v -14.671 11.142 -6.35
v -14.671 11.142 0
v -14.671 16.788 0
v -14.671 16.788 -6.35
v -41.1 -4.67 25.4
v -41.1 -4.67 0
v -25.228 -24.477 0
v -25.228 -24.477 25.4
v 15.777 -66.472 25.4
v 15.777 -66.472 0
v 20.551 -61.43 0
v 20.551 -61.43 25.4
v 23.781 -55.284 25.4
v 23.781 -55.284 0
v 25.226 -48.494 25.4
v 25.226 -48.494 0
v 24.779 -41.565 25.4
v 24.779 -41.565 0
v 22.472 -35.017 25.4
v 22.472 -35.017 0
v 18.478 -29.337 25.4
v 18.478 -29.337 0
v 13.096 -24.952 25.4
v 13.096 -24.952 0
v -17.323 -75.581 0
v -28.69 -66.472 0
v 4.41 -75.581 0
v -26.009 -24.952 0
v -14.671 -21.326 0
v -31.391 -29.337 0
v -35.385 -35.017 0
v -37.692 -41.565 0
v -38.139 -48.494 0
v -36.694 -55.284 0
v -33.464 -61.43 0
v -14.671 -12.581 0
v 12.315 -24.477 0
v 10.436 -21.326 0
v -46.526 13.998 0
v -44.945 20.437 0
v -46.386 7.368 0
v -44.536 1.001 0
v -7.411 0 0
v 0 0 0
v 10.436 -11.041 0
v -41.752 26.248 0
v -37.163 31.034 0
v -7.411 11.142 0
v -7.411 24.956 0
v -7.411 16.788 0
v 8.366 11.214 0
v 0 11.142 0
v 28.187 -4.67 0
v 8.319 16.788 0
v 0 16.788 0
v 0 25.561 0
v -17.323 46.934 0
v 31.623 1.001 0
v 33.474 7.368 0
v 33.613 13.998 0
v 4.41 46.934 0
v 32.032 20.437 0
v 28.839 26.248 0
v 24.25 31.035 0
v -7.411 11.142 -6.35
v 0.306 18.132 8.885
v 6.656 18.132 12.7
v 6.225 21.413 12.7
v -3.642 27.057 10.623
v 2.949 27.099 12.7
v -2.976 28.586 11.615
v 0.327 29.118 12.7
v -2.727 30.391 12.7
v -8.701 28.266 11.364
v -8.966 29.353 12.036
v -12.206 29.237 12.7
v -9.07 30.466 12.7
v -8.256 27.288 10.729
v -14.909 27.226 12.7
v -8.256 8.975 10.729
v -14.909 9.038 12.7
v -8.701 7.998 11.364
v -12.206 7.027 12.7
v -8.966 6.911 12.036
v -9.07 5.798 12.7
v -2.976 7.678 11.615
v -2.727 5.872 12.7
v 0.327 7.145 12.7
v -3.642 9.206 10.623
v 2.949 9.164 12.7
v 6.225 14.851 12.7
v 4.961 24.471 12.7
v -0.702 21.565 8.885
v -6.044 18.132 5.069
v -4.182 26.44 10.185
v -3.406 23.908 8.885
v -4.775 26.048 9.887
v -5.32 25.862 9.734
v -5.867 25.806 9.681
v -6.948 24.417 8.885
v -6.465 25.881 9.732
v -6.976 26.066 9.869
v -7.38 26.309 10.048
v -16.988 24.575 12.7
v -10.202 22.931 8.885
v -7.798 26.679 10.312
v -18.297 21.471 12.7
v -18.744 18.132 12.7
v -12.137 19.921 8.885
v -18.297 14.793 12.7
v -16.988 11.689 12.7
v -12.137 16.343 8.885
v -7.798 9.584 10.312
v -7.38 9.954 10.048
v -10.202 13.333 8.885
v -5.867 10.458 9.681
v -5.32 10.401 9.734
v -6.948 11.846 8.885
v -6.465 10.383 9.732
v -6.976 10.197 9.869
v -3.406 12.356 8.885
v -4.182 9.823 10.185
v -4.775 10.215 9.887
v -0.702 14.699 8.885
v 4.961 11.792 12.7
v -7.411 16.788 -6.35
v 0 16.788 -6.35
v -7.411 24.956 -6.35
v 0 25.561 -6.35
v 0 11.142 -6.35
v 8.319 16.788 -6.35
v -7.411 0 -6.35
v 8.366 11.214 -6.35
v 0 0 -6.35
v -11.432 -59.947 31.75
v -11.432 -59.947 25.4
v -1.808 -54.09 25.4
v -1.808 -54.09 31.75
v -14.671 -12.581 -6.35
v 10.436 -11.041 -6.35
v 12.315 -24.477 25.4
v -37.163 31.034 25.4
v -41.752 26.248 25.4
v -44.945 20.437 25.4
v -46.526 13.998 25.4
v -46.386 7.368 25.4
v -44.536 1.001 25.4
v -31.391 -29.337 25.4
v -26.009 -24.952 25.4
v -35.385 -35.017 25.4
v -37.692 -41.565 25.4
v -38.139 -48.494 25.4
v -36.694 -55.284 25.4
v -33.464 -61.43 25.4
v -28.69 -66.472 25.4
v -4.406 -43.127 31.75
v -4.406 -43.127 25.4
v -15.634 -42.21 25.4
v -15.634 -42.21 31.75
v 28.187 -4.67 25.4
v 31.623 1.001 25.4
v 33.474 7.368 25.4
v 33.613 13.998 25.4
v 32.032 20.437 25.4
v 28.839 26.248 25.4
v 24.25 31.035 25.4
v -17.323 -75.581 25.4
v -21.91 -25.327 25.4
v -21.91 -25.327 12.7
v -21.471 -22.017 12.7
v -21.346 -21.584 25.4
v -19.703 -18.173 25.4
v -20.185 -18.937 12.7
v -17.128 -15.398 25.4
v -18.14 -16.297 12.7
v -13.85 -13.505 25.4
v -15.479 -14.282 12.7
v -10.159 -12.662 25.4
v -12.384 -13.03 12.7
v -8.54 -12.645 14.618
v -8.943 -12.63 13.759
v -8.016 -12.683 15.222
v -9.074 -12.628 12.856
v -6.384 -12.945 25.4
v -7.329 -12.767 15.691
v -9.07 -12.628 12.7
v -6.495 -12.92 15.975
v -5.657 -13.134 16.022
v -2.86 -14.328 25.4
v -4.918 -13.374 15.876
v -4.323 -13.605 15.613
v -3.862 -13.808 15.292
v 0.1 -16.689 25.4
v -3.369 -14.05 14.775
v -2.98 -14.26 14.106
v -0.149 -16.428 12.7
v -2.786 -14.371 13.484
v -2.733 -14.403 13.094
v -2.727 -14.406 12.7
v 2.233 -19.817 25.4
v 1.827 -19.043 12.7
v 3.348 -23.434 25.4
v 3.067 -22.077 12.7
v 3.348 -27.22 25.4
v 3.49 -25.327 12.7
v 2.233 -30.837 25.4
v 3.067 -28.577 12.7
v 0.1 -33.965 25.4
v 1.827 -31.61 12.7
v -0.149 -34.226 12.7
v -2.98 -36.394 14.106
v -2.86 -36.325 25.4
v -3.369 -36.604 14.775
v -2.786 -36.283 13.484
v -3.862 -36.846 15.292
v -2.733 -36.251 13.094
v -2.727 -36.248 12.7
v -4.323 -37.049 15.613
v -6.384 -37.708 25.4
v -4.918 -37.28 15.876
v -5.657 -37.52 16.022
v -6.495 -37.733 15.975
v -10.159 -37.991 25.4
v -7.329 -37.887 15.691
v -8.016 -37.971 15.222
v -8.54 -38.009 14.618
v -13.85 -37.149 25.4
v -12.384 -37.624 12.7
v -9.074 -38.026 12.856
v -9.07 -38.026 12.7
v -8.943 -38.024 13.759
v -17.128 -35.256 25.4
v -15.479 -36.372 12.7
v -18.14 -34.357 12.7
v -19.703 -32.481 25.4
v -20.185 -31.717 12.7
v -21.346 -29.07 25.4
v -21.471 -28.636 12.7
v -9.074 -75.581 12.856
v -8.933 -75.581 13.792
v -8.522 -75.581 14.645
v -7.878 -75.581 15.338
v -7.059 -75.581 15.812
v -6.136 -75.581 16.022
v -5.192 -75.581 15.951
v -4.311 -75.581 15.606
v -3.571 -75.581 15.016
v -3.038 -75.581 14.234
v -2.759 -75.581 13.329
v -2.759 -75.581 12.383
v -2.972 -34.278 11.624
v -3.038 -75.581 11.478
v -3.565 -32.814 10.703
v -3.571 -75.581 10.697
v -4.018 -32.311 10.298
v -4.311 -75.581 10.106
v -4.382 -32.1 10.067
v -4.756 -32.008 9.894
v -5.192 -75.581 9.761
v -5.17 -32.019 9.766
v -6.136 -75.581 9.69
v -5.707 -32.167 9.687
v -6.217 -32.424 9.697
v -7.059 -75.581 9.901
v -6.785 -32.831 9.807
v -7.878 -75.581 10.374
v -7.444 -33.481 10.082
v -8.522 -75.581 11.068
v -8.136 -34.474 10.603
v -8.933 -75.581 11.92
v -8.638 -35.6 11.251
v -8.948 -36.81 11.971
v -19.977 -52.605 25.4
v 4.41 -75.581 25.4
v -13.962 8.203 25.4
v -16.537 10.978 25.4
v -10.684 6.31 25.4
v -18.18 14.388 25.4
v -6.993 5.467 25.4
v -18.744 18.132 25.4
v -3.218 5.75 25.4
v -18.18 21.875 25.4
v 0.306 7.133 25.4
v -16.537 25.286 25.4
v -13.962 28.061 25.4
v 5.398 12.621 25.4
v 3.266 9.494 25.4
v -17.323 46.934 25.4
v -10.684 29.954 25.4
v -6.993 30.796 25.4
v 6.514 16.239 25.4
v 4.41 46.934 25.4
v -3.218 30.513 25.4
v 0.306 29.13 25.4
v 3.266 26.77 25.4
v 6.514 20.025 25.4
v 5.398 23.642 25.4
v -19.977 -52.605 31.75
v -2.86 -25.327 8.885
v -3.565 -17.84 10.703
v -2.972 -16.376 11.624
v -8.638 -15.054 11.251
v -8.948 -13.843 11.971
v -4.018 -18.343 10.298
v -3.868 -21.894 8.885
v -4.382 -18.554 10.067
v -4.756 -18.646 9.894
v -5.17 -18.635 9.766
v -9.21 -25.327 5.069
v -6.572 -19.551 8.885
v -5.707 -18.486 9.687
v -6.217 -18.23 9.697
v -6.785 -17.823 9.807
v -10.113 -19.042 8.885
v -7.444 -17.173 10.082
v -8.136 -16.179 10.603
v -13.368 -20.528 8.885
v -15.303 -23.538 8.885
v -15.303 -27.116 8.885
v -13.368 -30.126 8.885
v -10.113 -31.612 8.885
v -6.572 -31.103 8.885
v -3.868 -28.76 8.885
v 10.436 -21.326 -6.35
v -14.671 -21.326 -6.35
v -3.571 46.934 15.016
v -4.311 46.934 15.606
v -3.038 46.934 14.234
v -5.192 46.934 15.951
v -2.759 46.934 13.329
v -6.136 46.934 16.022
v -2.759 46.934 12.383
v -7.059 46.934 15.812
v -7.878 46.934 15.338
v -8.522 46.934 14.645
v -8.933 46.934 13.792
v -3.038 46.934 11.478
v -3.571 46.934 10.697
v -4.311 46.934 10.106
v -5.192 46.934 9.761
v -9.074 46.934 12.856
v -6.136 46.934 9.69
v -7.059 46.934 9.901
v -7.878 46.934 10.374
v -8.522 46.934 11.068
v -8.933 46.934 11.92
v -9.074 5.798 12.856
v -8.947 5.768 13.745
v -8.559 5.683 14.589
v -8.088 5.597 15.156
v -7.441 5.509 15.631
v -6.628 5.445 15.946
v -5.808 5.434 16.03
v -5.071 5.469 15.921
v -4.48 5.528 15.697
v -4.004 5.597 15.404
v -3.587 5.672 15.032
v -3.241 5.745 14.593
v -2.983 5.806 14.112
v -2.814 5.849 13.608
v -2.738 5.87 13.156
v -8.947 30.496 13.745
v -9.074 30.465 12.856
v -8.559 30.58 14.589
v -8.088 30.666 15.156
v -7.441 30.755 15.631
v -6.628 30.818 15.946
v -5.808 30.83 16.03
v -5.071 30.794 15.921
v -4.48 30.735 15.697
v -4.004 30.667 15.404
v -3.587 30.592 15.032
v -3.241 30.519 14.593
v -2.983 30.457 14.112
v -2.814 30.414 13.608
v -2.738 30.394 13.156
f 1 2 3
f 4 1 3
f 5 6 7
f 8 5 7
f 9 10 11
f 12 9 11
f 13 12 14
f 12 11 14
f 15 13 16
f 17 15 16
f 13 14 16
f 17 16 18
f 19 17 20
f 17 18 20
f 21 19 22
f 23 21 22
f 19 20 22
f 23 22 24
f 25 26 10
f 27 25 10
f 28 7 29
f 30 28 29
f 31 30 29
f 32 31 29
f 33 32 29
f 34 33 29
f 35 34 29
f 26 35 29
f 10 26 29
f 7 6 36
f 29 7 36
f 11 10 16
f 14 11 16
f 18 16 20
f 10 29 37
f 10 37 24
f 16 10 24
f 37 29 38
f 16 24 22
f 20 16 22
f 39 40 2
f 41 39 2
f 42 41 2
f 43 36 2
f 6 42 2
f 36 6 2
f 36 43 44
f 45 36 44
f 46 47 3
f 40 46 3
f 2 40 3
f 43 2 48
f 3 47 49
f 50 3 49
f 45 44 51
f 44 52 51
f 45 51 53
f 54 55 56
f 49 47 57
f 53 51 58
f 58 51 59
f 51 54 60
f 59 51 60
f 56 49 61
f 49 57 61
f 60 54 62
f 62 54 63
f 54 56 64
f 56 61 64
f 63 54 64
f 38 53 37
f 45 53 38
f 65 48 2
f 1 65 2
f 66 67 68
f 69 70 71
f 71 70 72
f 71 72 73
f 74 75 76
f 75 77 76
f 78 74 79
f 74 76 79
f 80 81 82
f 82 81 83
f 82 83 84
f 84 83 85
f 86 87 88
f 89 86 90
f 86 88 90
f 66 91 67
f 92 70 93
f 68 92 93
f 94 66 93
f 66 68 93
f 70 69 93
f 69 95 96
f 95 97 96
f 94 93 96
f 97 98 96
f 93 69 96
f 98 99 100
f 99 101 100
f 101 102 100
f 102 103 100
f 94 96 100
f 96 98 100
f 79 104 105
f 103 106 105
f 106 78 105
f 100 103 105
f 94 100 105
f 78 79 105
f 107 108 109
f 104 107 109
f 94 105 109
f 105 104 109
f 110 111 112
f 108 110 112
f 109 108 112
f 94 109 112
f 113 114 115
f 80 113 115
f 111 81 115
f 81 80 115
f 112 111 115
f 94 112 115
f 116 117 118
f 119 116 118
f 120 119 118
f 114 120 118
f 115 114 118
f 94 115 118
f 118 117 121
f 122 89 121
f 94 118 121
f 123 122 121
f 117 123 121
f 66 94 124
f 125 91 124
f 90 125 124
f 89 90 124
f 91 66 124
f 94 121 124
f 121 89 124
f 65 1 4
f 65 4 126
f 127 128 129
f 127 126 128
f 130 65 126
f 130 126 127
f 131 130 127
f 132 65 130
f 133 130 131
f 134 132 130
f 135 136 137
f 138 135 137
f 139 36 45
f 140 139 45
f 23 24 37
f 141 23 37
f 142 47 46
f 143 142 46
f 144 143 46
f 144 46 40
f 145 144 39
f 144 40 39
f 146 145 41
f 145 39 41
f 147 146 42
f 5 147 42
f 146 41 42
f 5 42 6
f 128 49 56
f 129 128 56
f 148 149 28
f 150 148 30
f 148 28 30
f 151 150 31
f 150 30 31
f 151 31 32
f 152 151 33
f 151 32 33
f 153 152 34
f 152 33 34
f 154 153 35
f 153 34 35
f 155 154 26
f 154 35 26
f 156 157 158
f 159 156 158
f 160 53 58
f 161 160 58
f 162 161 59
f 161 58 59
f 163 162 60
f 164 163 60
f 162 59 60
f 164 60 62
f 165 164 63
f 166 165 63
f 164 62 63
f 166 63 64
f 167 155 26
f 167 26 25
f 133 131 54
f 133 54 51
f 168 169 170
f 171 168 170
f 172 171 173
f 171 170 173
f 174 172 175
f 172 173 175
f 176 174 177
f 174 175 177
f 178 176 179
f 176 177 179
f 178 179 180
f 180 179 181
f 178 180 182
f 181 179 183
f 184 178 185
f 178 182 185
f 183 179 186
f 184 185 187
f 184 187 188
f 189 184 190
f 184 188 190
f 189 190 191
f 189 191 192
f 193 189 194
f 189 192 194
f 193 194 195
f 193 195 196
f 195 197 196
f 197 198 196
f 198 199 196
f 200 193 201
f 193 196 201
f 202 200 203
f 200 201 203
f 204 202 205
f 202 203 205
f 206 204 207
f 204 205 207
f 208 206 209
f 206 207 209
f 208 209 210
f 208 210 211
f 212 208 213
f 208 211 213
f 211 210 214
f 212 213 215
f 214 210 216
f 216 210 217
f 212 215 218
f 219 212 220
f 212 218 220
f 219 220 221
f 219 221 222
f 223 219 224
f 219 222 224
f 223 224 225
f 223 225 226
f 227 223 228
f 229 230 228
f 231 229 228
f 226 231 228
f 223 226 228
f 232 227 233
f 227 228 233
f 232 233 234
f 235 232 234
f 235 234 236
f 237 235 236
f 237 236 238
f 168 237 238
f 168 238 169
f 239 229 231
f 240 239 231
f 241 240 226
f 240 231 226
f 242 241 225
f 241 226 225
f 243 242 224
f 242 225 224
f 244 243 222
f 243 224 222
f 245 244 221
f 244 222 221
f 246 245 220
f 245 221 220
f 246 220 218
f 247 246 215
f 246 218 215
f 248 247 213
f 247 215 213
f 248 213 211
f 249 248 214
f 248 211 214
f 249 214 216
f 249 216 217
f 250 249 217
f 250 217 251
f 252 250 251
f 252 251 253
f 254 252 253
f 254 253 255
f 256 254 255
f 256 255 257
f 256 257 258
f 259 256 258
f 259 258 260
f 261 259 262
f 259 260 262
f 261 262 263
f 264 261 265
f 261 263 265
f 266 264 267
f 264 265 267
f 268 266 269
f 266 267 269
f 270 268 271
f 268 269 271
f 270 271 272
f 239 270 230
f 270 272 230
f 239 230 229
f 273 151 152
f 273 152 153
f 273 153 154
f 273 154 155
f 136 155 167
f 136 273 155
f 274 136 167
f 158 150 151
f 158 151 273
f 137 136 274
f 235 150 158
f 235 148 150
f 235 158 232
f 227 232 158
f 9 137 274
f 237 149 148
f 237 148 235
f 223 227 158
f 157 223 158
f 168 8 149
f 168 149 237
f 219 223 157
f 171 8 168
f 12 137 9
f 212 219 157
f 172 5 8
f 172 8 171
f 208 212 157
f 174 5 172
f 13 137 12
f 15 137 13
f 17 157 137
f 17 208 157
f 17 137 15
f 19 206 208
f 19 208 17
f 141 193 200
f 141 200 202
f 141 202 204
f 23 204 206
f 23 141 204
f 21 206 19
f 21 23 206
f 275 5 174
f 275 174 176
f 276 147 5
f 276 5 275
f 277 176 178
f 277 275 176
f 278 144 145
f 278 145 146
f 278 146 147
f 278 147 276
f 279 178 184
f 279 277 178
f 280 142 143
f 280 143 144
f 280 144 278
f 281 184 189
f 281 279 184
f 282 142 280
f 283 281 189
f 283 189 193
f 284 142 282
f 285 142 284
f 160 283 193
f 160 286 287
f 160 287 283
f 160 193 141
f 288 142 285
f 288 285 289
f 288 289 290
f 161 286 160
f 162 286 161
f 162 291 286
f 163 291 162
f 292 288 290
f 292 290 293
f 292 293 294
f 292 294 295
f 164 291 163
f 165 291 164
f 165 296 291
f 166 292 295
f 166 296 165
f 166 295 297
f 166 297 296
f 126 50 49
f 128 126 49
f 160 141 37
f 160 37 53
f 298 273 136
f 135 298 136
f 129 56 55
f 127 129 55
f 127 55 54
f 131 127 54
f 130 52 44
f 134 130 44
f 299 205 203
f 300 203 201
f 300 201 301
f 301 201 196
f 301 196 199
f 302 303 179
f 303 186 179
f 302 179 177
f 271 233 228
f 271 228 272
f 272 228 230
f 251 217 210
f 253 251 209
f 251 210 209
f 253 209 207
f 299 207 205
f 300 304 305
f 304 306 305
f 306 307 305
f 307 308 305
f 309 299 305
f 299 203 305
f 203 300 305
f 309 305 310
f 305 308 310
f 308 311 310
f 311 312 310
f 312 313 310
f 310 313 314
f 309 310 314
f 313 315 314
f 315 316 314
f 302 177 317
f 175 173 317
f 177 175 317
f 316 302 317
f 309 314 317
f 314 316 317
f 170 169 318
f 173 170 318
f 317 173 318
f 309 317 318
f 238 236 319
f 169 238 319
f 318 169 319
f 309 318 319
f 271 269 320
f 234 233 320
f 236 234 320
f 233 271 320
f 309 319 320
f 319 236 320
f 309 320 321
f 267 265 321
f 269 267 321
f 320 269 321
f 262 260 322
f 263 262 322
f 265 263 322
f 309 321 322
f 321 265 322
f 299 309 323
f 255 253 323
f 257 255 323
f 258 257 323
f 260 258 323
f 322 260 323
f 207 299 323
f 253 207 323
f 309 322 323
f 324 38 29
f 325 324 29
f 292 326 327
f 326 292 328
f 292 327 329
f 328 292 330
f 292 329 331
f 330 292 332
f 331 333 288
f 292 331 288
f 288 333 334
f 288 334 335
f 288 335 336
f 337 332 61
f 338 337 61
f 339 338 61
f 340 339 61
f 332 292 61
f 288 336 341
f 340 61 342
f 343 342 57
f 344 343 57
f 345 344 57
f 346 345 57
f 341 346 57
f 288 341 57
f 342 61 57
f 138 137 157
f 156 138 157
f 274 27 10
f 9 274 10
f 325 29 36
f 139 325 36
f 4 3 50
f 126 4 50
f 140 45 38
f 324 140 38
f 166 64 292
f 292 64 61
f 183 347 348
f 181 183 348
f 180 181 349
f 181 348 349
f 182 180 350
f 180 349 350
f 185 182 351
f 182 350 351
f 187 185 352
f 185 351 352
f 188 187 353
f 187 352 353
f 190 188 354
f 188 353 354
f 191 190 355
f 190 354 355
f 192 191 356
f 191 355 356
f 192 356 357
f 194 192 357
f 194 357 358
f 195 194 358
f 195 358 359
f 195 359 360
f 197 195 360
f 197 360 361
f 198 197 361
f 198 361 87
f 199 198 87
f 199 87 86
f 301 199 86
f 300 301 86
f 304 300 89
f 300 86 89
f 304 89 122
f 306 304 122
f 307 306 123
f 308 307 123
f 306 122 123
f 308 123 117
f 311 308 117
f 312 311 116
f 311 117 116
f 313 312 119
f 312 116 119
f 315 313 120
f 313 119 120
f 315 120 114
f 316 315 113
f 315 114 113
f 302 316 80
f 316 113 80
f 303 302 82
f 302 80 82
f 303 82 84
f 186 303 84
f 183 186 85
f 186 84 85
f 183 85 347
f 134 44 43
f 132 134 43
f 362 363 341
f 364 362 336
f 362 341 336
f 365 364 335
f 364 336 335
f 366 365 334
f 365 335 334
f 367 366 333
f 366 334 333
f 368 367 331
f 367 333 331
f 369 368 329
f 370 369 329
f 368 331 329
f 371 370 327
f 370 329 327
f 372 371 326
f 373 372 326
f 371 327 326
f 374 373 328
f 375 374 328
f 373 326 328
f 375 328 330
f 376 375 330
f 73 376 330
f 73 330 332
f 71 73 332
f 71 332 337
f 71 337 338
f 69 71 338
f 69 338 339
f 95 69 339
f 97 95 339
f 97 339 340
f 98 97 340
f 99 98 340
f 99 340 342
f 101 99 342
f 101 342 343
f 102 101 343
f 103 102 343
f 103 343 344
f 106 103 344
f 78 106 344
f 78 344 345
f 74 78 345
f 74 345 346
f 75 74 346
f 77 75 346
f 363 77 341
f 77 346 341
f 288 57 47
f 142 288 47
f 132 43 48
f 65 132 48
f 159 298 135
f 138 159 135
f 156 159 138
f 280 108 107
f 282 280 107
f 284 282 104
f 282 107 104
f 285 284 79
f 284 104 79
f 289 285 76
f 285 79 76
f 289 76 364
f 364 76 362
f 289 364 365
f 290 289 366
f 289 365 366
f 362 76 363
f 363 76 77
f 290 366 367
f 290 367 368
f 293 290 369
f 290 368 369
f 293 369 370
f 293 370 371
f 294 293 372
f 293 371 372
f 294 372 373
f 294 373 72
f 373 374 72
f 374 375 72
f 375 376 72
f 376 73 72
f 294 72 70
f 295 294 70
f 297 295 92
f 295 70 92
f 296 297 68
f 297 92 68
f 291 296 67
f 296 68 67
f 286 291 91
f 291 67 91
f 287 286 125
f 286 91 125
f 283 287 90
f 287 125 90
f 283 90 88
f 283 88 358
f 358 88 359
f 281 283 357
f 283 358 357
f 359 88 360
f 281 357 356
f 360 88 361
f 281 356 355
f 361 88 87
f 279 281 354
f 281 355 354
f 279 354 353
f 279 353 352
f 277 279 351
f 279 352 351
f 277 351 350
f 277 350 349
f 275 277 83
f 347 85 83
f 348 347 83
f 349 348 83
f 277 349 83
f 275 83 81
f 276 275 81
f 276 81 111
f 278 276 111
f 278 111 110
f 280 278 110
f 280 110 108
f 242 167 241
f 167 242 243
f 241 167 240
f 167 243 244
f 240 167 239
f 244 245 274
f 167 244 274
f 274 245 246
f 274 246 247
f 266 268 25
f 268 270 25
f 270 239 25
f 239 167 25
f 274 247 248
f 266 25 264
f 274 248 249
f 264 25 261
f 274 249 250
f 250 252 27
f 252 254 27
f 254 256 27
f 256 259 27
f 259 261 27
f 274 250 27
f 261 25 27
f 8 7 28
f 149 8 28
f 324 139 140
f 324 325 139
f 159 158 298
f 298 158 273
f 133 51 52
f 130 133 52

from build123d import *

# Parameters (mm, degrees)
F1_DEPTH  = 25.4
F3_D      = 25.4
F3_DEPTH  = 12.7
F3_TIP    = 7.6309298617
F5_DEPTH  = 6.35
F7_D      = 6.35
F7_DEPTH  = 254
F7_TIP    = 1.9077324654
F9_DEPTH  = 6.35
F11_DEPTH = 6.35


with BuildPart() as f1:
    # F0 (on Top) → F1 (new body)
    with BuildSketch(Plane.XY):
        with BuildLine():
            Line((4.4096680358, 46.9340346754), (-17.3225291073, 46.9340346754))
            Line((-17.3225291073, 46.9340346754), (-37.1629750587, 31.0344995595))
            ThreePointArc((-37.1629750587, 31.0344995595), (-46.5261500129, 13.9975710547), (-41.0999868401, -4.6701211252))
            Line((-41.0999868401, -4.6701211252), (-25.2276921751, -24.4765747183))
            Line((-25.2276921751, -24.4765747183), (-26.0085705919, -24.951683338))
            ThreePointArc((-26.0085705919, -24.951683338), (-38.1533474778, -45.0139671836), (-28.6899548002, -66.4717172459))
            Line((-28.6899548002, -66.4717172459), (-17.3225291073, -75.5812302232))
            Line((-17.3225291073, -75.5812302232), (4.4096680358, -75.5812302232))
            Line((4.4096680358, -75.5812302232), (15.7770905265, -66.4717187425))
            ThreePointArc((15.7770905265, -66.4717187425), (25.2404819789, -45.0139682034), (13.0957040513, -24.9516850564))
            Line((13.0957040513, -24.9516850564), (12.3148227185, -24.4765747183))
            Line((12.3148227185, -24.4765747183), (28.1871199764, -4.6701202151))
            ThreePointArc((28.1871199764, -4.6701202151), (33.6132842187, 13.9975716539), (24.2501102406, 31.0345006951))
            Line((24.2501102406, 31.0345006951), (4.4096680358, 46.9340346754))
        make_face()
    extrude(amount=F1_DEPTH)

    # F3
    with Locations(Plane.XY.offset(25.4)):
        with Locations((-6.0439212248, 18.131762743), (-9.2097837478, -25.3269076347)):
            Hole(F3_D / 2, depth=F3_DEPTH)
            with Locations((0, 0, -(F3_DEPTH + F3_TIP / 2))):  # 118° drill point
                Cone(0, F3_D / 2, F3_TIP, mode=Mode.SUBTRACT)

    # F4 (on face) → F5 (join)
    with BuildSketch(Plane.XY.offset(25.4)):
        Polygon((-11.431774831, -59.9473722219), (-1.8083986281, -54.0896646738), (-4.4056227723, -43.1271588469), (-15.6341717727, -42.2096651921), (-19.9765725551, -52.6051287559), align=None)
    extrude(amount=F5_DEPTH)

    # F7
    with Locations(Plane.XZ.offset(75.5812302232)):
        with Locations((-5.8986586519, 12.8560494632)):
            Hole(F7_D / 2, depth=F7_DEPTH)
            with Locations((0, 0, -(F7_DEPTH + F7_TIP / 2))):  # 118° drill point
                Cone(0, F7_D / 2, F7_TIP, mode=Mode.SUBTRACT)

    # F8 (on face) → F9 (join)
    with BuildSketch(Plane(origin=(0, 0, 0), x_dir=(1, 0, 0), z_dir=(0, 0, -1))):
        Polygon((-7.4111339636, -24.9558594078), (0, -25.5608521402), (0, -16.788488254), (8.3186198026, -16.788488254), (8.3663046534, -11.2136853721), (0, -11.1421230232), (0, 0), (-7.4111339636, 0), (-7.4111339636, -11.1421230232), (-14.6710202098, -11.1421230232), (-14.6710202098, -16.788488254), (-7.4111339636, -16.788488254), align=None)
    extrude(amount=F9_DEPTH)

    # F10 (on face) → F11 (join)
    with BuildSketch(Plane(origin=(0, 0, 0), x_dir=(1, 0, 0), z_dir=(0, 0, -1))):
        Polygon((-14.6710202098, 12.5811770558), (10.4360869154, 11.0410777852), (10.4360869154, 21.3259179145), (-14.6710202098, 21.3259179145), align=None)
    extrude(amount=F11_DEPTH)


solid = f1.part
